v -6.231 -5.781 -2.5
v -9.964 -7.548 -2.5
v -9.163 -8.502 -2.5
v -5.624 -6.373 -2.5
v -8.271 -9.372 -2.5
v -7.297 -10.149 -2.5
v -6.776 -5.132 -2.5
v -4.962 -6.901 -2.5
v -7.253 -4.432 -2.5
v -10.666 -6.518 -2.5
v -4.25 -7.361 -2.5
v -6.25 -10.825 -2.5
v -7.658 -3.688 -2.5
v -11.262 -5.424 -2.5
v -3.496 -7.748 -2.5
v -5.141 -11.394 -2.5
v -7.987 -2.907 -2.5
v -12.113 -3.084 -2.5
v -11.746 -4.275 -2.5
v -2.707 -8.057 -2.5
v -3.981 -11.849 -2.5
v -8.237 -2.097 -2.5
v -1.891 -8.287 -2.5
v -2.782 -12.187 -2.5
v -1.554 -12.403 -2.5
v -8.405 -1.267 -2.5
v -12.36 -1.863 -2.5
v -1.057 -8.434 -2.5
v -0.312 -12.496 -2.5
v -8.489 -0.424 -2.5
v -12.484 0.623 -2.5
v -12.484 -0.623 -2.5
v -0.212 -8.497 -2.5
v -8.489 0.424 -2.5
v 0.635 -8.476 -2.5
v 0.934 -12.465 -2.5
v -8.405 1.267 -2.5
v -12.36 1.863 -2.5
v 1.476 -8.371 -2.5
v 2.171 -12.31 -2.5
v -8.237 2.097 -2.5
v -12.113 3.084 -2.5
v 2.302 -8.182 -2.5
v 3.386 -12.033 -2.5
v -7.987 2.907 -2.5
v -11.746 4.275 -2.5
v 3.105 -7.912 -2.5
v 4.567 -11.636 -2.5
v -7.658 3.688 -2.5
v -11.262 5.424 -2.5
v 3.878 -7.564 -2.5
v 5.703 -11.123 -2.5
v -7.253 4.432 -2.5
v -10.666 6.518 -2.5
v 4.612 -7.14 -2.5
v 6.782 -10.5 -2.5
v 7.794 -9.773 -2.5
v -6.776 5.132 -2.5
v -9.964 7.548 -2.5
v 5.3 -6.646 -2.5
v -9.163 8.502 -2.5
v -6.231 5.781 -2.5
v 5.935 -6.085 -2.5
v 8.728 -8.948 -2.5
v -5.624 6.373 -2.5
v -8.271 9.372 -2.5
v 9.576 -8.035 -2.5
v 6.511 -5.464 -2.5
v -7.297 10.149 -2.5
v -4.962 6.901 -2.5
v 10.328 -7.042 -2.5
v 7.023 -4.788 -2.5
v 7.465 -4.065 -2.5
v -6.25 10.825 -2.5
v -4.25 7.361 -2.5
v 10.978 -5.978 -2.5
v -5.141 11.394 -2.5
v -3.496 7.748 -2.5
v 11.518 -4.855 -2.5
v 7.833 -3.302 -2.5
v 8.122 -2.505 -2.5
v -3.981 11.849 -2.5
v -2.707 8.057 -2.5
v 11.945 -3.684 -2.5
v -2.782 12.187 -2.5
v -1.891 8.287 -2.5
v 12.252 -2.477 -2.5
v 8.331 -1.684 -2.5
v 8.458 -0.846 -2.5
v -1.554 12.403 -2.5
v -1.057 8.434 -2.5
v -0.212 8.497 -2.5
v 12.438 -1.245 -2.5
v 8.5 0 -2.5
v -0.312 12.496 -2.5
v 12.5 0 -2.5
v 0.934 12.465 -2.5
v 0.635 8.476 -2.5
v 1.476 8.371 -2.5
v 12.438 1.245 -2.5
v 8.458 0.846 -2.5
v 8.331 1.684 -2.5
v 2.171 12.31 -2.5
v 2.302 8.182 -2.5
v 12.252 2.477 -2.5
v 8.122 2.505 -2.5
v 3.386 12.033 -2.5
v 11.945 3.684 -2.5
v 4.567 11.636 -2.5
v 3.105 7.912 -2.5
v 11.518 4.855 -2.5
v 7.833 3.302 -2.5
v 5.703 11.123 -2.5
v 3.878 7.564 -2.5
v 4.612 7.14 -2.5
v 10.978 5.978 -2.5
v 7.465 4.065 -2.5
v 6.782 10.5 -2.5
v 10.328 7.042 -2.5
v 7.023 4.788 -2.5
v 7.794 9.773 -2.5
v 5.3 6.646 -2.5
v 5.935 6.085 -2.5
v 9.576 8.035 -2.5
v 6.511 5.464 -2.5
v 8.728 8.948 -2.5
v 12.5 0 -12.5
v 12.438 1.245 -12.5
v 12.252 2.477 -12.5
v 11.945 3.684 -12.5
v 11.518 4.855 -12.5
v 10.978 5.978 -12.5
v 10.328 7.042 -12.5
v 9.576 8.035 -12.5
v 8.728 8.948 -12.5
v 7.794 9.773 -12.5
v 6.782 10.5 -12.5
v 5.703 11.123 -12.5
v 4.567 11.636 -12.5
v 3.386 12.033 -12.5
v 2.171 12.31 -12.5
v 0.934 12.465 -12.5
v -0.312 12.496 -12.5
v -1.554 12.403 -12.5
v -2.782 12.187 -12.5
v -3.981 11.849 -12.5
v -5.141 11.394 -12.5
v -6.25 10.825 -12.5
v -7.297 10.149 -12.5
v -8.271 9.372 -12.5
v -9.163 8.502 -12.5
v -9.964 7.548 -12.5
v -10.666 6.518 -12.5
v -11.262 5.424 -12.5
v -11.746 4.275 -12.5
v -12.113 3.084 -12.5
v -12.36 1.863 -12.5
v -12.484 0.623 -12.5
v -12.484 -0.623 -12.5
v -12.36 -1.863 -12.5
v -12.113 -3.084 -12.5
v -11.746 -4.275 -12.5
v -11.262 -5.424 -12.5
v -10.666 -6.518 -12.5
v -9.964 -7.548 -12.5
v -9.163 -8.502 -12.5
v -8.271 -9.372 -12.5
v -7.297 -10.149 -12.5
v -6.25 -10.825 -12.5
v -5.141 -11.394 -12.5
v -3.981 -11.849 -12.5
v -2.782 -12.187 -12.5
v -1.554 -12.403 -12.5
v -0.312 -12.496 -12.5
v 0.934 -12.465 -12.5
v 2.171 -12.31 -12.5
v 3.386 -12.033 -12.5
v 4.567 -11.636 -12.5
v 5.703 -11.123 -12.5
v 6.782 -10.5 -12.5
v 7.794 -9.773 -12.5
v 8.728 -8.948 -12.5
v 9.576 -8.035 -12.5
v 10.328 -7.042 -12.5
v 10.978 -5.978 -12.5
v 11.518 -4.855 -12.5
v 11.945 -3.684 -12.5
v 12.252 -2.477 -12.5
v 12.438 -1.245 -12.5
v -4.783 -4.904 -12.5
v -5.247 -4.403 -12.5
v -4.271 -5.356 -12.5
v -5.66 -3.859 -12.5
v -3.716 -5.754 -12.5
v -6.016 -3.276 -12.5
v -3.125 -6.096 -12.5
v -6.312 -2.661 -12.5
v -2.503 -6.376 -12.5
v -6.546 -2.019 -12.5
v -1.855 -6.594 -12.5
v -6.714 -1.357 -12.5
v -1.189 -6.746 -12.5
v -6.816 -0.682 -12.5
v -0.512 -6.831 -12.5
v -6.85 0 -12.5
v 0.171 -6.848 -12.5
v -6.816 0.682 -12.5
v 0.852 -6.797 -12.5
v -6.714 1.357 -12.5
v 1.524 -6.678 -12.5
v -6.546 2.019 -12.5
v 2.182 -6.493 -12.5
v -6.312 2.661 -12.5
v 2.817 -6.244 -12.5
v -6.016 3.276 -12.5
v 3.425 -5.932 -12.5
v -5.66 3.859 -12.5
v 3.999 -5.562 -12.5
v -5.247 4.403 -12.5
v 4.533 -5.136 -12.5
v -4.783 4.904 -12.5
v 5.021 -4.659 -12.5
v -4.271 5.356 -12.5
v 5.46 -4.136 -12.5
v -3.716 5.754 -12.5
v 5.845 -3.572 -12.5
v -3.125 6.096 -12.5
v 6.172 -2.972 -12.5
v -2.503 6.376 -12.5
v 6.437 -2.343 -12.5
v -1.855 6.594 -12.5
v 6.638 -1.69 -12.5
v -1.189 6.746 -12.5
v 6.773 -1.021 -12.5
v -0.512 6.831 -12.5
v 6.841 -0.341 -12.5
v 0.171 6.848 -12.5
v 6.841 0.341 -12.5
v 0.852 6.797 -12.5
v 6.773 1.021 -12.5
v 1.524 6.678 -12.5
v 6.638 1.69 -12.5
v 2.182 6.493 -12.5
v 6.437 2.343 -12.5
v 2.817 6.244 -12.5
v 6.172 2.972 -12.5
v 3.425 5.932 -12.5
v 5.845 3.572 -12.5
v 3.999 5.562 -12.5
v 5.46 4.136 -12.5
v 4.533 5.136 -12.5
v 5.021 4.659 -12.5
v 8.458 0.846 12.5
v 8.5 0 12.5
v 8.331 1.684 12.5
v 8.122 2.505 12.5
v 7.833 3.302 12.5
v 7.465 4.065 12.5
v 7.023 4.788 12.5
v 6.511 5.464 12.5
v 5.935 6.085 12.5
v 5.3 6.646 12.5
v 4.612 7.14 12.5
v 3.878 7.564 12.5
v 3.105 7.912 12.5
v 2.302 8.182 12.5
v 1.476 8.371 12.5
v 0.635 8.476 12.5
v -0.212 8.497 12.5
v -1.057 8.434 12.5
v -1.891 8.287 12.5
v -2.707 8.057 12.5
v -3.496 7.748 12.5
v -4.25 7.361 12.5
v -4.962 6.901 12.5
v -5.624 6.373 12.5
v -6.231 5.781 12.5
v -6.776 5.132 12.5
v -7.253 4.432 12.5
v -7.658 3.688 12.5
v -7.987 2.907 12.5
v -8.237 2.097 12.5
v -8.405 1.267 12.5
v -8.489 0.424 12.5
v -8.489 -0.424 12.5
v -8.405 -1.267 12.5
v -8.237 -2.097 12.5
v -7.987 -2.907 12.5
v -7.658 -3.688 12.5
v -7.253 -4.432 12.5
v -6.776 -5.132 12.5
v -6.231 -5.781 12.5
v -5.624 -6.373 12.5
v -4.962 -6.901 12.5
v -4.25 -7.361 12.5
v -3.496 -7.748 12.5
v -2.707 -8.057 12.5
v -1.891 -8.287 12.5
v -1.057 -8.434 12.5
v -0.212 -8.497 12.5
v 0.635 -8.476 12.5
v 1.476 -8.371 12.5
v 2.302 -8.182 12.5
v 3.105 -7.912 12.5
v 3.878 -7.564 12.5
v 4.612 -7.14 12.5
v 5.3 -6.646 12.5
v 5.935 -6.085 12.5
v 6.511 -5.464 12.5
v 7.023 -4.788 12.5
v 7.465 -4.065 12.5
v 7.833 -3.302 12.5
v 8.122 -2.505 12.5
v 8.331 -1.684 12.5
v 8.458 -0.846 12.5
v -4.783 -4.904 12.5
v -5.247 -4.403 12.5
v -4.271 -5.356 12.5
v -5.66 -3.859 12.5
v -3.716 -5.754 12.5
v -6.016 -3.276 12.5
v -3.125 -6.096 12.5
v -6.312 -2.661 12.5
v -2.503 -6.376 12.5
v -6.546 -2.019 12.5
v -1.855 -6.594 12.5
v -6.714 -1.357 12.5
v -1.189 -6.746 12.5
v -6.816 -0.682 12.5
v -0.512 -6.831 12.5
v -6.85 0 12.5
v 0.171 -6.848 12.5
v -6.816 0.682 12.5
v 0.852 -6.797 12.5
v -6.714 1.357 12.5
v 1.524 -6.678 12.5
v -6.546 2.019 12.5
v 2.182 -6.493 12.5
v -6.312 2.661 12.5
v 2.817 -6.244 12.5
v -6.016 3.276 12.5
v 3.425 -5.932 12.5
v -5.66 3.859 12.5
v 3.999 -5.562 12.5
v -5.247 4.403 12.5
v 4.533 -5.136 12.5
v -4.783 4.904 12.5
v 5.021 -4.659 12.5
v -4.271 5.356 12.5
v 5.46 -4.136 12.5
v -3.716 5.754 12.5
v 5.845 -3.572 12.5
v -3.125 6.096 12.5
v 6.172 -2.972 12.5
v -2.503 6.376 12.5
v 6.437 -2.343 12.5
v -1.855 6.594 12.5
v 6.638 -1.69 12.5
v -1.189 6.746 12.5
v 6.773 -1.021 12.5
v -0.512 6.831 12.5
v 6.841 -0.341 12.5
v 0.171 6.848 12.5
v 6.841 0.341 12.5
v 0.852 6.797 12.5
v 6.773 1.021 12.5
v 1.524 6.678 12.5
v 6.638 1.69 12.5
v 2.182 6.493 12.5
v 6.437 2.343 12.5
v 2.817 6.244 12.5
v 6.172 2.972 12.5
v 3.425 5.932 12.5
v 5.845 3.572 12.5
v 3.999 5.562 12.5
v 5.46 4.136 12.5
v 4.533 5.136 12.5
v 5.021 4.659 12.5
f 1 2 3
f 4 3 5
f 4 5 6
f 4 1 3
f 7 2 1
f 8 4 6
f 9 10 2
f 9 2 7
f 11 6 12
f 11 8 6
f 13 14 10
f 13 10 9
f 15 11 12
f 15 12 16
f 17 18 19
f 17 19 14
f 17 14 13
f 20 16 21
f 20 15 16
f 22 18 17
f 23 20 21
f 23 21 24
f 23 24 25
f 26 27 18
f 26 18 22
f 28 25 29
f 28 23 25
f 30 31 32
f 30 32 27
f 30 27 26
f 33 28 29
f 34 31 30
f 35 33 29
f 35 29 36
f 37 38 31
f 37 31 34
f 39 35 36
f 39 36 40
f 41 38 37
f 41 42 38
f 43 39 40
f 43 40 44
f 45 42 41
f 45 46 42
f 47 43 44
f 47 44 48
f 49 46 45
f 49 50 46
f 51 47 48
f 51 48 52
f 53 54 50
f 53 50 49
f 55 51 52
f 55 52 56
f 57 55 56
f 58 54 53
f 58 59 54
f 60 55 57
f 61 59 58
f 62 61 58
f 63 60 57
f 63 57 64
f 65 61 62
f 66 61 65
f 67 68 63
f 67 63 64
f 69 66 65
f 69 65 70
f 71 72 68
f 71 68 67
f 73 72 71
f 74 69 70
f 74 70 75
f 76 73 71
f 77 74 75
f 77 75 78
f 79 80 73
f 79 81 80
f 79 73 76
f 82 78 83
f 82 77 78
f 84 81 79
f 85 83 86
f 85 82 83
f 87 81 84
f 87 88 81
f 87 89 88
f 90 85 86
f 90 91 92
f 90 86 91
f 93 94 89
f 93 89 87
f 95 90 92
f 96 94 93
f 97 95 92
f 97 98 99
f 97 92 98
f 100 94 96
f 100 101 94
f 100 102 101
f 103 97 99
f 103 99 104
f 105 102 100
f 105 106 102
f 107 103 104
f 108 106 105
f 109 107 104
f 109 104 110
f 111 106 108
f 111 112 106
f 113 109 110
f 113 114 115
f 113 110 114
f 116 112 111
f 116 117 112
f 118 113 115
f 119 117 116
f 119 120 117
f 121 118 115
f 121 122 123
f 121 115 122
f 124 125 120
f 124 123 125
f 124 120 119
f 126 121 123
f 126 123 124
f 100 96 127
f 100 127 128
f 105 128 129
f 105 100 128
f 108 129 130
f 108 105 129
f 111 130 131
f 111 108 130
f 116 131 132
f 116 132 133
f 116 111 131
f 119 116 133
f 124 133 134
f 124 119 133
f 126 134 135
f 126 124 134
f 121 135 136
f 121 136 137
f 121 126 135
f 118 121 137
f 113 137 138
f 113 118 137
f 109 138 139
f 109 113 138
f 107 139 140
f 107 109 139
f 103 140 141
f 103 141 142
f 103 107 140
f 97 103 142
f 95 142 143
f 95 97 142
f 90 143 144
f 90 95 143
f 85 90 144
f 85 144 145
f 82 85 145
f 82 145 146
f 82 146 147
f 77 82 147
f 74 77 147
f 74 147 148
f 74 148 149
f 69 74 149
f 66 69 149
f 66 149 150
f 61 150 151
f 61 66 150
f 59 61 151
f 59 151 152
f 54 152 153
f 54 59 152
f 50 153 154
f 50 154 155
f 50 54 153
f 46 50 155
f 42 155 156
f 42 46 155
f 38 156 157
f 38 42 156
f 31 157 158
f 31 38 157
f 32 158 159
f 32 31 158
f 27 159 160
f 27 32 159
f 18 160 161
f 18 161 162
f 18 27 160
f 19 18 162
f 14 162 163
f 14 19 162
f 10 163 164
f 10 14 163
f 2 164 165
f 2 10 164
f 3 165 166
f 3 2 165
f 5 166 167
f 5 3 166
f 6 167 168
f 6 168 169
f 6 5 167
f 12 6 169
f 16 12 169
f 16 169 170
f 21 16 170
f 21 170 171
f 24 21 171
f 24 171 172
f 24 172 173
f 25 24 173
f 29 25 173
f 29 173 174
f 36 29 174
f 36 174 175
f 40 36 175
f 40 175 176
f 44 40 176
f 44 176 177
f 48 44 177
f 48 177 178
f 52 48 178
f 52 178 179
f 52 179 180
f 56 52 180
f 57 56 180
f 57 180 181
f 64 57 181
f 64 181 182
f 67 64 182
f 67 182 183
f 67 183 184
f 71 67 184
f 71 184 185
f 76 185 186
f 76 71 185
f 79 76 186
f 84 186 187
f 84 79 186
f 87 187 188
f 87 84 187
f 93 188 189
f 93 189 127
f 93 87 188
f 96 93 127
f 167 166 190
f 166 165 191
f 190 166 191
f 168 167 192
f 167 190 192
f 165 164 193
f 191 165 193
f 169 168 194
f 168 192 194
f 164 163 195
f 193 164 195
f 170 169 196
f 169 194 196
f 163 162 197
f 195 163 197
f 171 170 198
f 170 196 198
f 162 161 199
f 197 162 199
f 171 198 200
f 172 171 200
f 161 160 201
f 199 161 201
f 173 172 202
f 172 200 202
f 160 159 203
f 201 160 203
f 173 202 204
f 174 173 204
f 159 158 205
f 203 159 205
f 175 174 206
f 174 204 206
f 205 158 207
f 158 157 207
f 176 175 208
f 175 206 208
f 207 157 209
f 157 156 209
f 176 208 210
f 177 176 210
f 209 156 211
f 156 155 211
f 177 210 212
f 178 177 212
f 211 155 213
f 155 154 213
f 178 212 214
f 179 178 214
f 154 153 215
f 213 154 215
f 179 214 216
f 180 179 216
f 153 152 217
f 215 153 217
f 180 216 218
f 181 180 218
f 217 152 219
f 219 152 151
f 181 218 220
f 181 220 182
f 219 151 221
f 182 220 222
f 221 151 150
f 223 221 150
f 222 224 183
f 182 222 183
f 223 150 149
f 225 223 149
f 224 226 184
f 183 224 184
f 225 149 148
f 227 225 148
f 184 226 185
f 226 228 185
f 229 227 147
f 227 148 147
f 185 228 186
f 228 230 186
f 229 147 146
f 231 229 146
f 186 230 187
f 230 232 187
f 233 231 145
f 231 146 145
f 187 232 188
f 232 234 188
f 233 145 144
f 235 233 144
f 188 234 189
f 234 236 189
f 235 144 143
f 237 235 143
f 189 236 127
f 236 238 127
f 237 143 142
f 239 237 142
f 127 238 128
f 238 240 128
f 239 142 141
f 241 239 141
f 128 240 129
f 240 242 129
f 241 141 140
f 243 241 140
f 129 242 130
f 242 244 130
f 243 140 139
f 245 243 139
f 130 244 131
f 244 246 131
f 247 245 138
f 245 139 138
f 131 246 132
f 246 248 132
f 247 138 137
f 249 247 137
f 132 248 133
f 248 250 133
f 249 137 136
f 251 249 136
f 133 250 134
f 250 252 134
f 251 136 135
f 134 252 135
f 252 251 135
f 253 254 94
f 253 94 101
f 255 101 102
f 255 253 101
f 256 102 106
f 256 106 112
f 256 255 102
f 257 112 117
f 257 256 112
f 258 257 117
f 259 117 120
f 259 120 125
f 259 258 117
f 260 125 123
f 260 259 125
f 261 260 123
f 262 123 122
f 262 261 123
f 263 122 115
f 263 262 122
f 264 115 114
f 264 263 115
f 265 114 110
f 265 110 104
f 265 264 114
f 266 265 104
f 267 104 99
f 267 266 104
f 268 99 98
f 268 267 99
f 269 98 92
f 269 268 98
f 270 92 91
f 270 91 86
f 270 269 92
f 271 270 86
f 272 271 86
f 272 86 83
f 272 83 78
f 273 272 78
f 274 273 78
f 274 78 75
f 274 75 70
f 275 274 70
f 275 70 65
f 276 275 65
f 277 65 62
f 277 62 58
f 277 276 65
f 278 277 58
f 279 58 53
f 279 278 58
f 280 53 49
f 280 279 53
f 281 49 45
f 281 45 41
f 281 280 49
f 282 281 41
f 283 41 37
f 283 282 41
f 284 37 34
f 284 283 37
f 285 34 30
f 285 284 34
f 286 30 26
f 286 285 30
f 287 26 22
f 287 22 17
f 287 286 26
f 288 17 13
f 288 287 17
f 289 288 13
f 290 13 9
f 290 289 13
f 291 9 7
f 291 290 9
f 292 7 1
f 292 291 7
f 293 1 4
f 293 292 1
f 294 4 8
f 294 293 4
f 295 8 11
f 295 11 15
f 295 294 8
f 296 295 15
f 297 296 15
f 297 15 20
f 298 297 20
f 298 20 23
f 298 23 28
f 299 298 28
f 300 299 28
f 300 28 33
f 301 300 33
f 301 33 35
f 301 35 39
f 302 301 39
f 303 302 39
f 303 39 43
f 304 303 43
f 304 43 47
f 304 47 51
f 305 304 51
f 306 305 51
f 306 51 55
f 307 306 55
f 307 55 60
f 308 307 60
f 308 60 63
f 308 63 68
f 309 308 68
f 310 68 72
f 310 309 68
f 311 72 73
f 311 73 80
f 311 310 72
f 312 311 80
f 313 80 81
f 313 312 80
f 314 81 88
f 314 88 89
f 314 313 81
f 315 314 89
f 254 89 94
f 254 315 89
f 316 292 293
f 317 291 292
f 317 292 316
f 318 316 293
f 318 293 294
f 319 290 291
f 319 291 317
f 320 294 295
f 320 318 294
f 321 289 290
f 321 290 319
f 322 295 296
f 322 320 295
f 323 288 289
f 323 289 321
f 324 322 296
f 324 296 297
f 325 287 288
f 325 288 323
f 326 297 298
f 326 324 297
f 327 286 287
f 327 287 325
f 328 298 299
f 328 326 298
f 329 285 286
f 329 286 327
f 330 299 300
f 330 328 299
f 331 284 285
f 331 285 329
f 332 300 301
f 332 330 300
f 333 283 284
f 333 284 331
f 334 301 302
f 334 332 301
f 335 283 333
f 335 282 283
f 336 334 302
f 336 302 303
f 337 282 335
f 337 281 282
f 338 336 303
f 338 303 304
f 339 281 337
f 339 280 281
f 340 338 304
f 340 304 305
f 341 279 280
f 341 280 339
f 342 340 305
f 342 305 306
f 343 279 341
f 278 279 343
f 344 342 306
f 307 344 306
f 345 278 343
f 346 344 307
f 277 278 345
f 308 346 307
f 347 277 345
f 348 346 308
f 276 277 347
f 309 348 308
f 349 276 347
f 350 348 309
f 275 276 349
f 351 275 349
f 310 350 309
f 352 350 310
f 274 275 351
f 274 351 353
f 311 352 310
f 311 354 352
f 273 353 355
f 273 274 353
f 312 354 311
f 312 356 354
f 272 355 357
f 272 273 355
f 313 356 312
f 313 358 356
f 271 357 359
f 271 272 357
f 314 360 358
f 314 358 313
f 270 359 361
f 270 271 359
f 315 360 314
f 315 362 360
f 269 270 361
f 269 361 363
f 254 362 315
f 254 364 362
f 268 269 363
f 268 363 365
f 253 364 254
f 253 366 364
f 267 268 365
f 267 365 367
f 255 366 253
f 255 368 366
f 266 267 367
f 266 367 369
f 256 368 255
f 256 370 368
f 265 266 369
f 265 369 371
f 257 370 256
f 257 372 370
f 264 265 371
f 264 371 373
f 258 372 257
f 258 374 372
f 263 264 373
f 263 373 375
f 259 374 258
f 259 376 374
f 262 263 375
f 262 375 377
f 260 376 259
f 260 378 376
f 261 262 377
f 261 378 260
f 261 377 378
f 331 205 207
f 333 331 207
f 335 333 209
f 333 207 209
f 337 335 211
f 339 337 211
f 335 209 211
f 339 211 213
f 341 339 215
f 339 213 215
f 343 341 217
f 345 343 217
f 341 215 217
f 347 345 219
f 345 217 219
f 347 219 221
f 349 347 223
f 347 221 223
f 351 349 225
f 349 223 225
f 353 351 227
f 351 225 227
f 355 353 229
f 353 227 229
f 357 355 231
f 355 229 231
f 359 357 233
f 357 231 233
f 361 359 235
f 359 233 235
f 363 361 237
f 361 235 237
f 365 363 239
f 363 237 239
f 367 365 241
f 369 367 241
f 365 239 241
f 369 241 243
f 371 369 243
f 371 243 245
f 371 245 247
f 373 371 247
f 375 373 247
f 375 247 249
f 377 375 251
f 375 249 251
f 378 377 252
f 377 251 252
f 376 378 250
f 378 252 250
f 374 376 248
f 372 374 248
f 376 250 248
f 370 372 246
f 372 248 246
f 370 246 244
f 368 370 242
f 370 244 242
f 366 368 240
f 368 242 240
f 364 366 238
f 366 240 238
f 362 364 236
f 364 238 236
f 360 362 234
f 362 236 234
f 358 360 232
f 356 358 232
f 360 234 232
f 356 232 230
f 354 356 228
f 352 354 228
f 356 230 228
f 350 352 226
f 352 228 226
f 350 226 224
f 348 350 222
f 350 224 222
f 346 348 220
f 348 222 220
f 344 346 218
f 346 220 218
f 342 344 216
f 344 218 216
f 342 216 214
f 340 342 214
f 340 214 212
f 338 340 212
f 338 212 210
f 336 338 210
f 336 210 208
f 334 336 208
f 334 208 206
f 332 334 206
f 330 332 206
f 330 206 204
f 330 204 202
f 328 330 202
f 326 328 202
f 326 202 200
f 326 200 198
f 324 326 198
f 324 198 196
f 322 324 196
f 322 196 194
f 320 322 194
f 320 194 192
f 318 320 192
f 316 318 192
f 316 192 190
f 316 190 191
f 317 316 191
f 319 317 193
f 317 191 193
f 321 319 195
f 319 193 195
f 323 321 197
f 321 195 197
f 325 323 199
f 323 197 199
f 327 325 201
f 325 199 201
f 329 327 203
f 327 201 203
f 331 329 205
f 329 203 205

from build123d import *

# Parameters (mm, degrees)
SKETCH1_R           = 12.5
BOSS_EXTRUDE1_DEPTH = 12.5
SKETCH2_R           = 6.85
CUT_EXTRUDE1_DEPTH  = 25
SKETCH3_OUTSIDE_W   = 35.66
SKETCH3_OUTSIDE_H   = 35.66
SKETCH3_OUTSIDE_R   = 8.5
CUT_EXTRUDE2_DEPTH  = 15


with BuildPart() as part:
    # Sketch1 → Boss-Extrude1 (new, symmetric)
    with BuildSketch(Plane.XY):
        Circle(SKETCH1_R)
    extrude(amount=BOSS_EXTRUDE1_DEPTH, both=True)

    # Sketch2 → Cut-Extrude1 (cut)
    with BuildSketch(Plane(origin=(0, 0, -12.5), x_dir=(-1, 0, 0), z_dir=(0, 0, -1))):
        Circle(SKETCH2_R)
    extrude(amount=-CUT_EXTRUDE1_DEPTH, mode=Mode.SUBTRACT)

    # Sketch3 outside → Cut-Extrude2 (cut)
    with BuildSketch(Plane.XY.offset(12.5)):
        Rectangle(SKETCH3_OUTSIDE_W, SKETCH3_OUTSIDE_H)
        Circle(SKETCH3_OUTSIDE_R, mode=Mode.SUBTRACT)
    extrude(amount=-CUT_EXTRUDE2_DEPTH, mode=Mode.SUBTRACT)


solid = part.part
